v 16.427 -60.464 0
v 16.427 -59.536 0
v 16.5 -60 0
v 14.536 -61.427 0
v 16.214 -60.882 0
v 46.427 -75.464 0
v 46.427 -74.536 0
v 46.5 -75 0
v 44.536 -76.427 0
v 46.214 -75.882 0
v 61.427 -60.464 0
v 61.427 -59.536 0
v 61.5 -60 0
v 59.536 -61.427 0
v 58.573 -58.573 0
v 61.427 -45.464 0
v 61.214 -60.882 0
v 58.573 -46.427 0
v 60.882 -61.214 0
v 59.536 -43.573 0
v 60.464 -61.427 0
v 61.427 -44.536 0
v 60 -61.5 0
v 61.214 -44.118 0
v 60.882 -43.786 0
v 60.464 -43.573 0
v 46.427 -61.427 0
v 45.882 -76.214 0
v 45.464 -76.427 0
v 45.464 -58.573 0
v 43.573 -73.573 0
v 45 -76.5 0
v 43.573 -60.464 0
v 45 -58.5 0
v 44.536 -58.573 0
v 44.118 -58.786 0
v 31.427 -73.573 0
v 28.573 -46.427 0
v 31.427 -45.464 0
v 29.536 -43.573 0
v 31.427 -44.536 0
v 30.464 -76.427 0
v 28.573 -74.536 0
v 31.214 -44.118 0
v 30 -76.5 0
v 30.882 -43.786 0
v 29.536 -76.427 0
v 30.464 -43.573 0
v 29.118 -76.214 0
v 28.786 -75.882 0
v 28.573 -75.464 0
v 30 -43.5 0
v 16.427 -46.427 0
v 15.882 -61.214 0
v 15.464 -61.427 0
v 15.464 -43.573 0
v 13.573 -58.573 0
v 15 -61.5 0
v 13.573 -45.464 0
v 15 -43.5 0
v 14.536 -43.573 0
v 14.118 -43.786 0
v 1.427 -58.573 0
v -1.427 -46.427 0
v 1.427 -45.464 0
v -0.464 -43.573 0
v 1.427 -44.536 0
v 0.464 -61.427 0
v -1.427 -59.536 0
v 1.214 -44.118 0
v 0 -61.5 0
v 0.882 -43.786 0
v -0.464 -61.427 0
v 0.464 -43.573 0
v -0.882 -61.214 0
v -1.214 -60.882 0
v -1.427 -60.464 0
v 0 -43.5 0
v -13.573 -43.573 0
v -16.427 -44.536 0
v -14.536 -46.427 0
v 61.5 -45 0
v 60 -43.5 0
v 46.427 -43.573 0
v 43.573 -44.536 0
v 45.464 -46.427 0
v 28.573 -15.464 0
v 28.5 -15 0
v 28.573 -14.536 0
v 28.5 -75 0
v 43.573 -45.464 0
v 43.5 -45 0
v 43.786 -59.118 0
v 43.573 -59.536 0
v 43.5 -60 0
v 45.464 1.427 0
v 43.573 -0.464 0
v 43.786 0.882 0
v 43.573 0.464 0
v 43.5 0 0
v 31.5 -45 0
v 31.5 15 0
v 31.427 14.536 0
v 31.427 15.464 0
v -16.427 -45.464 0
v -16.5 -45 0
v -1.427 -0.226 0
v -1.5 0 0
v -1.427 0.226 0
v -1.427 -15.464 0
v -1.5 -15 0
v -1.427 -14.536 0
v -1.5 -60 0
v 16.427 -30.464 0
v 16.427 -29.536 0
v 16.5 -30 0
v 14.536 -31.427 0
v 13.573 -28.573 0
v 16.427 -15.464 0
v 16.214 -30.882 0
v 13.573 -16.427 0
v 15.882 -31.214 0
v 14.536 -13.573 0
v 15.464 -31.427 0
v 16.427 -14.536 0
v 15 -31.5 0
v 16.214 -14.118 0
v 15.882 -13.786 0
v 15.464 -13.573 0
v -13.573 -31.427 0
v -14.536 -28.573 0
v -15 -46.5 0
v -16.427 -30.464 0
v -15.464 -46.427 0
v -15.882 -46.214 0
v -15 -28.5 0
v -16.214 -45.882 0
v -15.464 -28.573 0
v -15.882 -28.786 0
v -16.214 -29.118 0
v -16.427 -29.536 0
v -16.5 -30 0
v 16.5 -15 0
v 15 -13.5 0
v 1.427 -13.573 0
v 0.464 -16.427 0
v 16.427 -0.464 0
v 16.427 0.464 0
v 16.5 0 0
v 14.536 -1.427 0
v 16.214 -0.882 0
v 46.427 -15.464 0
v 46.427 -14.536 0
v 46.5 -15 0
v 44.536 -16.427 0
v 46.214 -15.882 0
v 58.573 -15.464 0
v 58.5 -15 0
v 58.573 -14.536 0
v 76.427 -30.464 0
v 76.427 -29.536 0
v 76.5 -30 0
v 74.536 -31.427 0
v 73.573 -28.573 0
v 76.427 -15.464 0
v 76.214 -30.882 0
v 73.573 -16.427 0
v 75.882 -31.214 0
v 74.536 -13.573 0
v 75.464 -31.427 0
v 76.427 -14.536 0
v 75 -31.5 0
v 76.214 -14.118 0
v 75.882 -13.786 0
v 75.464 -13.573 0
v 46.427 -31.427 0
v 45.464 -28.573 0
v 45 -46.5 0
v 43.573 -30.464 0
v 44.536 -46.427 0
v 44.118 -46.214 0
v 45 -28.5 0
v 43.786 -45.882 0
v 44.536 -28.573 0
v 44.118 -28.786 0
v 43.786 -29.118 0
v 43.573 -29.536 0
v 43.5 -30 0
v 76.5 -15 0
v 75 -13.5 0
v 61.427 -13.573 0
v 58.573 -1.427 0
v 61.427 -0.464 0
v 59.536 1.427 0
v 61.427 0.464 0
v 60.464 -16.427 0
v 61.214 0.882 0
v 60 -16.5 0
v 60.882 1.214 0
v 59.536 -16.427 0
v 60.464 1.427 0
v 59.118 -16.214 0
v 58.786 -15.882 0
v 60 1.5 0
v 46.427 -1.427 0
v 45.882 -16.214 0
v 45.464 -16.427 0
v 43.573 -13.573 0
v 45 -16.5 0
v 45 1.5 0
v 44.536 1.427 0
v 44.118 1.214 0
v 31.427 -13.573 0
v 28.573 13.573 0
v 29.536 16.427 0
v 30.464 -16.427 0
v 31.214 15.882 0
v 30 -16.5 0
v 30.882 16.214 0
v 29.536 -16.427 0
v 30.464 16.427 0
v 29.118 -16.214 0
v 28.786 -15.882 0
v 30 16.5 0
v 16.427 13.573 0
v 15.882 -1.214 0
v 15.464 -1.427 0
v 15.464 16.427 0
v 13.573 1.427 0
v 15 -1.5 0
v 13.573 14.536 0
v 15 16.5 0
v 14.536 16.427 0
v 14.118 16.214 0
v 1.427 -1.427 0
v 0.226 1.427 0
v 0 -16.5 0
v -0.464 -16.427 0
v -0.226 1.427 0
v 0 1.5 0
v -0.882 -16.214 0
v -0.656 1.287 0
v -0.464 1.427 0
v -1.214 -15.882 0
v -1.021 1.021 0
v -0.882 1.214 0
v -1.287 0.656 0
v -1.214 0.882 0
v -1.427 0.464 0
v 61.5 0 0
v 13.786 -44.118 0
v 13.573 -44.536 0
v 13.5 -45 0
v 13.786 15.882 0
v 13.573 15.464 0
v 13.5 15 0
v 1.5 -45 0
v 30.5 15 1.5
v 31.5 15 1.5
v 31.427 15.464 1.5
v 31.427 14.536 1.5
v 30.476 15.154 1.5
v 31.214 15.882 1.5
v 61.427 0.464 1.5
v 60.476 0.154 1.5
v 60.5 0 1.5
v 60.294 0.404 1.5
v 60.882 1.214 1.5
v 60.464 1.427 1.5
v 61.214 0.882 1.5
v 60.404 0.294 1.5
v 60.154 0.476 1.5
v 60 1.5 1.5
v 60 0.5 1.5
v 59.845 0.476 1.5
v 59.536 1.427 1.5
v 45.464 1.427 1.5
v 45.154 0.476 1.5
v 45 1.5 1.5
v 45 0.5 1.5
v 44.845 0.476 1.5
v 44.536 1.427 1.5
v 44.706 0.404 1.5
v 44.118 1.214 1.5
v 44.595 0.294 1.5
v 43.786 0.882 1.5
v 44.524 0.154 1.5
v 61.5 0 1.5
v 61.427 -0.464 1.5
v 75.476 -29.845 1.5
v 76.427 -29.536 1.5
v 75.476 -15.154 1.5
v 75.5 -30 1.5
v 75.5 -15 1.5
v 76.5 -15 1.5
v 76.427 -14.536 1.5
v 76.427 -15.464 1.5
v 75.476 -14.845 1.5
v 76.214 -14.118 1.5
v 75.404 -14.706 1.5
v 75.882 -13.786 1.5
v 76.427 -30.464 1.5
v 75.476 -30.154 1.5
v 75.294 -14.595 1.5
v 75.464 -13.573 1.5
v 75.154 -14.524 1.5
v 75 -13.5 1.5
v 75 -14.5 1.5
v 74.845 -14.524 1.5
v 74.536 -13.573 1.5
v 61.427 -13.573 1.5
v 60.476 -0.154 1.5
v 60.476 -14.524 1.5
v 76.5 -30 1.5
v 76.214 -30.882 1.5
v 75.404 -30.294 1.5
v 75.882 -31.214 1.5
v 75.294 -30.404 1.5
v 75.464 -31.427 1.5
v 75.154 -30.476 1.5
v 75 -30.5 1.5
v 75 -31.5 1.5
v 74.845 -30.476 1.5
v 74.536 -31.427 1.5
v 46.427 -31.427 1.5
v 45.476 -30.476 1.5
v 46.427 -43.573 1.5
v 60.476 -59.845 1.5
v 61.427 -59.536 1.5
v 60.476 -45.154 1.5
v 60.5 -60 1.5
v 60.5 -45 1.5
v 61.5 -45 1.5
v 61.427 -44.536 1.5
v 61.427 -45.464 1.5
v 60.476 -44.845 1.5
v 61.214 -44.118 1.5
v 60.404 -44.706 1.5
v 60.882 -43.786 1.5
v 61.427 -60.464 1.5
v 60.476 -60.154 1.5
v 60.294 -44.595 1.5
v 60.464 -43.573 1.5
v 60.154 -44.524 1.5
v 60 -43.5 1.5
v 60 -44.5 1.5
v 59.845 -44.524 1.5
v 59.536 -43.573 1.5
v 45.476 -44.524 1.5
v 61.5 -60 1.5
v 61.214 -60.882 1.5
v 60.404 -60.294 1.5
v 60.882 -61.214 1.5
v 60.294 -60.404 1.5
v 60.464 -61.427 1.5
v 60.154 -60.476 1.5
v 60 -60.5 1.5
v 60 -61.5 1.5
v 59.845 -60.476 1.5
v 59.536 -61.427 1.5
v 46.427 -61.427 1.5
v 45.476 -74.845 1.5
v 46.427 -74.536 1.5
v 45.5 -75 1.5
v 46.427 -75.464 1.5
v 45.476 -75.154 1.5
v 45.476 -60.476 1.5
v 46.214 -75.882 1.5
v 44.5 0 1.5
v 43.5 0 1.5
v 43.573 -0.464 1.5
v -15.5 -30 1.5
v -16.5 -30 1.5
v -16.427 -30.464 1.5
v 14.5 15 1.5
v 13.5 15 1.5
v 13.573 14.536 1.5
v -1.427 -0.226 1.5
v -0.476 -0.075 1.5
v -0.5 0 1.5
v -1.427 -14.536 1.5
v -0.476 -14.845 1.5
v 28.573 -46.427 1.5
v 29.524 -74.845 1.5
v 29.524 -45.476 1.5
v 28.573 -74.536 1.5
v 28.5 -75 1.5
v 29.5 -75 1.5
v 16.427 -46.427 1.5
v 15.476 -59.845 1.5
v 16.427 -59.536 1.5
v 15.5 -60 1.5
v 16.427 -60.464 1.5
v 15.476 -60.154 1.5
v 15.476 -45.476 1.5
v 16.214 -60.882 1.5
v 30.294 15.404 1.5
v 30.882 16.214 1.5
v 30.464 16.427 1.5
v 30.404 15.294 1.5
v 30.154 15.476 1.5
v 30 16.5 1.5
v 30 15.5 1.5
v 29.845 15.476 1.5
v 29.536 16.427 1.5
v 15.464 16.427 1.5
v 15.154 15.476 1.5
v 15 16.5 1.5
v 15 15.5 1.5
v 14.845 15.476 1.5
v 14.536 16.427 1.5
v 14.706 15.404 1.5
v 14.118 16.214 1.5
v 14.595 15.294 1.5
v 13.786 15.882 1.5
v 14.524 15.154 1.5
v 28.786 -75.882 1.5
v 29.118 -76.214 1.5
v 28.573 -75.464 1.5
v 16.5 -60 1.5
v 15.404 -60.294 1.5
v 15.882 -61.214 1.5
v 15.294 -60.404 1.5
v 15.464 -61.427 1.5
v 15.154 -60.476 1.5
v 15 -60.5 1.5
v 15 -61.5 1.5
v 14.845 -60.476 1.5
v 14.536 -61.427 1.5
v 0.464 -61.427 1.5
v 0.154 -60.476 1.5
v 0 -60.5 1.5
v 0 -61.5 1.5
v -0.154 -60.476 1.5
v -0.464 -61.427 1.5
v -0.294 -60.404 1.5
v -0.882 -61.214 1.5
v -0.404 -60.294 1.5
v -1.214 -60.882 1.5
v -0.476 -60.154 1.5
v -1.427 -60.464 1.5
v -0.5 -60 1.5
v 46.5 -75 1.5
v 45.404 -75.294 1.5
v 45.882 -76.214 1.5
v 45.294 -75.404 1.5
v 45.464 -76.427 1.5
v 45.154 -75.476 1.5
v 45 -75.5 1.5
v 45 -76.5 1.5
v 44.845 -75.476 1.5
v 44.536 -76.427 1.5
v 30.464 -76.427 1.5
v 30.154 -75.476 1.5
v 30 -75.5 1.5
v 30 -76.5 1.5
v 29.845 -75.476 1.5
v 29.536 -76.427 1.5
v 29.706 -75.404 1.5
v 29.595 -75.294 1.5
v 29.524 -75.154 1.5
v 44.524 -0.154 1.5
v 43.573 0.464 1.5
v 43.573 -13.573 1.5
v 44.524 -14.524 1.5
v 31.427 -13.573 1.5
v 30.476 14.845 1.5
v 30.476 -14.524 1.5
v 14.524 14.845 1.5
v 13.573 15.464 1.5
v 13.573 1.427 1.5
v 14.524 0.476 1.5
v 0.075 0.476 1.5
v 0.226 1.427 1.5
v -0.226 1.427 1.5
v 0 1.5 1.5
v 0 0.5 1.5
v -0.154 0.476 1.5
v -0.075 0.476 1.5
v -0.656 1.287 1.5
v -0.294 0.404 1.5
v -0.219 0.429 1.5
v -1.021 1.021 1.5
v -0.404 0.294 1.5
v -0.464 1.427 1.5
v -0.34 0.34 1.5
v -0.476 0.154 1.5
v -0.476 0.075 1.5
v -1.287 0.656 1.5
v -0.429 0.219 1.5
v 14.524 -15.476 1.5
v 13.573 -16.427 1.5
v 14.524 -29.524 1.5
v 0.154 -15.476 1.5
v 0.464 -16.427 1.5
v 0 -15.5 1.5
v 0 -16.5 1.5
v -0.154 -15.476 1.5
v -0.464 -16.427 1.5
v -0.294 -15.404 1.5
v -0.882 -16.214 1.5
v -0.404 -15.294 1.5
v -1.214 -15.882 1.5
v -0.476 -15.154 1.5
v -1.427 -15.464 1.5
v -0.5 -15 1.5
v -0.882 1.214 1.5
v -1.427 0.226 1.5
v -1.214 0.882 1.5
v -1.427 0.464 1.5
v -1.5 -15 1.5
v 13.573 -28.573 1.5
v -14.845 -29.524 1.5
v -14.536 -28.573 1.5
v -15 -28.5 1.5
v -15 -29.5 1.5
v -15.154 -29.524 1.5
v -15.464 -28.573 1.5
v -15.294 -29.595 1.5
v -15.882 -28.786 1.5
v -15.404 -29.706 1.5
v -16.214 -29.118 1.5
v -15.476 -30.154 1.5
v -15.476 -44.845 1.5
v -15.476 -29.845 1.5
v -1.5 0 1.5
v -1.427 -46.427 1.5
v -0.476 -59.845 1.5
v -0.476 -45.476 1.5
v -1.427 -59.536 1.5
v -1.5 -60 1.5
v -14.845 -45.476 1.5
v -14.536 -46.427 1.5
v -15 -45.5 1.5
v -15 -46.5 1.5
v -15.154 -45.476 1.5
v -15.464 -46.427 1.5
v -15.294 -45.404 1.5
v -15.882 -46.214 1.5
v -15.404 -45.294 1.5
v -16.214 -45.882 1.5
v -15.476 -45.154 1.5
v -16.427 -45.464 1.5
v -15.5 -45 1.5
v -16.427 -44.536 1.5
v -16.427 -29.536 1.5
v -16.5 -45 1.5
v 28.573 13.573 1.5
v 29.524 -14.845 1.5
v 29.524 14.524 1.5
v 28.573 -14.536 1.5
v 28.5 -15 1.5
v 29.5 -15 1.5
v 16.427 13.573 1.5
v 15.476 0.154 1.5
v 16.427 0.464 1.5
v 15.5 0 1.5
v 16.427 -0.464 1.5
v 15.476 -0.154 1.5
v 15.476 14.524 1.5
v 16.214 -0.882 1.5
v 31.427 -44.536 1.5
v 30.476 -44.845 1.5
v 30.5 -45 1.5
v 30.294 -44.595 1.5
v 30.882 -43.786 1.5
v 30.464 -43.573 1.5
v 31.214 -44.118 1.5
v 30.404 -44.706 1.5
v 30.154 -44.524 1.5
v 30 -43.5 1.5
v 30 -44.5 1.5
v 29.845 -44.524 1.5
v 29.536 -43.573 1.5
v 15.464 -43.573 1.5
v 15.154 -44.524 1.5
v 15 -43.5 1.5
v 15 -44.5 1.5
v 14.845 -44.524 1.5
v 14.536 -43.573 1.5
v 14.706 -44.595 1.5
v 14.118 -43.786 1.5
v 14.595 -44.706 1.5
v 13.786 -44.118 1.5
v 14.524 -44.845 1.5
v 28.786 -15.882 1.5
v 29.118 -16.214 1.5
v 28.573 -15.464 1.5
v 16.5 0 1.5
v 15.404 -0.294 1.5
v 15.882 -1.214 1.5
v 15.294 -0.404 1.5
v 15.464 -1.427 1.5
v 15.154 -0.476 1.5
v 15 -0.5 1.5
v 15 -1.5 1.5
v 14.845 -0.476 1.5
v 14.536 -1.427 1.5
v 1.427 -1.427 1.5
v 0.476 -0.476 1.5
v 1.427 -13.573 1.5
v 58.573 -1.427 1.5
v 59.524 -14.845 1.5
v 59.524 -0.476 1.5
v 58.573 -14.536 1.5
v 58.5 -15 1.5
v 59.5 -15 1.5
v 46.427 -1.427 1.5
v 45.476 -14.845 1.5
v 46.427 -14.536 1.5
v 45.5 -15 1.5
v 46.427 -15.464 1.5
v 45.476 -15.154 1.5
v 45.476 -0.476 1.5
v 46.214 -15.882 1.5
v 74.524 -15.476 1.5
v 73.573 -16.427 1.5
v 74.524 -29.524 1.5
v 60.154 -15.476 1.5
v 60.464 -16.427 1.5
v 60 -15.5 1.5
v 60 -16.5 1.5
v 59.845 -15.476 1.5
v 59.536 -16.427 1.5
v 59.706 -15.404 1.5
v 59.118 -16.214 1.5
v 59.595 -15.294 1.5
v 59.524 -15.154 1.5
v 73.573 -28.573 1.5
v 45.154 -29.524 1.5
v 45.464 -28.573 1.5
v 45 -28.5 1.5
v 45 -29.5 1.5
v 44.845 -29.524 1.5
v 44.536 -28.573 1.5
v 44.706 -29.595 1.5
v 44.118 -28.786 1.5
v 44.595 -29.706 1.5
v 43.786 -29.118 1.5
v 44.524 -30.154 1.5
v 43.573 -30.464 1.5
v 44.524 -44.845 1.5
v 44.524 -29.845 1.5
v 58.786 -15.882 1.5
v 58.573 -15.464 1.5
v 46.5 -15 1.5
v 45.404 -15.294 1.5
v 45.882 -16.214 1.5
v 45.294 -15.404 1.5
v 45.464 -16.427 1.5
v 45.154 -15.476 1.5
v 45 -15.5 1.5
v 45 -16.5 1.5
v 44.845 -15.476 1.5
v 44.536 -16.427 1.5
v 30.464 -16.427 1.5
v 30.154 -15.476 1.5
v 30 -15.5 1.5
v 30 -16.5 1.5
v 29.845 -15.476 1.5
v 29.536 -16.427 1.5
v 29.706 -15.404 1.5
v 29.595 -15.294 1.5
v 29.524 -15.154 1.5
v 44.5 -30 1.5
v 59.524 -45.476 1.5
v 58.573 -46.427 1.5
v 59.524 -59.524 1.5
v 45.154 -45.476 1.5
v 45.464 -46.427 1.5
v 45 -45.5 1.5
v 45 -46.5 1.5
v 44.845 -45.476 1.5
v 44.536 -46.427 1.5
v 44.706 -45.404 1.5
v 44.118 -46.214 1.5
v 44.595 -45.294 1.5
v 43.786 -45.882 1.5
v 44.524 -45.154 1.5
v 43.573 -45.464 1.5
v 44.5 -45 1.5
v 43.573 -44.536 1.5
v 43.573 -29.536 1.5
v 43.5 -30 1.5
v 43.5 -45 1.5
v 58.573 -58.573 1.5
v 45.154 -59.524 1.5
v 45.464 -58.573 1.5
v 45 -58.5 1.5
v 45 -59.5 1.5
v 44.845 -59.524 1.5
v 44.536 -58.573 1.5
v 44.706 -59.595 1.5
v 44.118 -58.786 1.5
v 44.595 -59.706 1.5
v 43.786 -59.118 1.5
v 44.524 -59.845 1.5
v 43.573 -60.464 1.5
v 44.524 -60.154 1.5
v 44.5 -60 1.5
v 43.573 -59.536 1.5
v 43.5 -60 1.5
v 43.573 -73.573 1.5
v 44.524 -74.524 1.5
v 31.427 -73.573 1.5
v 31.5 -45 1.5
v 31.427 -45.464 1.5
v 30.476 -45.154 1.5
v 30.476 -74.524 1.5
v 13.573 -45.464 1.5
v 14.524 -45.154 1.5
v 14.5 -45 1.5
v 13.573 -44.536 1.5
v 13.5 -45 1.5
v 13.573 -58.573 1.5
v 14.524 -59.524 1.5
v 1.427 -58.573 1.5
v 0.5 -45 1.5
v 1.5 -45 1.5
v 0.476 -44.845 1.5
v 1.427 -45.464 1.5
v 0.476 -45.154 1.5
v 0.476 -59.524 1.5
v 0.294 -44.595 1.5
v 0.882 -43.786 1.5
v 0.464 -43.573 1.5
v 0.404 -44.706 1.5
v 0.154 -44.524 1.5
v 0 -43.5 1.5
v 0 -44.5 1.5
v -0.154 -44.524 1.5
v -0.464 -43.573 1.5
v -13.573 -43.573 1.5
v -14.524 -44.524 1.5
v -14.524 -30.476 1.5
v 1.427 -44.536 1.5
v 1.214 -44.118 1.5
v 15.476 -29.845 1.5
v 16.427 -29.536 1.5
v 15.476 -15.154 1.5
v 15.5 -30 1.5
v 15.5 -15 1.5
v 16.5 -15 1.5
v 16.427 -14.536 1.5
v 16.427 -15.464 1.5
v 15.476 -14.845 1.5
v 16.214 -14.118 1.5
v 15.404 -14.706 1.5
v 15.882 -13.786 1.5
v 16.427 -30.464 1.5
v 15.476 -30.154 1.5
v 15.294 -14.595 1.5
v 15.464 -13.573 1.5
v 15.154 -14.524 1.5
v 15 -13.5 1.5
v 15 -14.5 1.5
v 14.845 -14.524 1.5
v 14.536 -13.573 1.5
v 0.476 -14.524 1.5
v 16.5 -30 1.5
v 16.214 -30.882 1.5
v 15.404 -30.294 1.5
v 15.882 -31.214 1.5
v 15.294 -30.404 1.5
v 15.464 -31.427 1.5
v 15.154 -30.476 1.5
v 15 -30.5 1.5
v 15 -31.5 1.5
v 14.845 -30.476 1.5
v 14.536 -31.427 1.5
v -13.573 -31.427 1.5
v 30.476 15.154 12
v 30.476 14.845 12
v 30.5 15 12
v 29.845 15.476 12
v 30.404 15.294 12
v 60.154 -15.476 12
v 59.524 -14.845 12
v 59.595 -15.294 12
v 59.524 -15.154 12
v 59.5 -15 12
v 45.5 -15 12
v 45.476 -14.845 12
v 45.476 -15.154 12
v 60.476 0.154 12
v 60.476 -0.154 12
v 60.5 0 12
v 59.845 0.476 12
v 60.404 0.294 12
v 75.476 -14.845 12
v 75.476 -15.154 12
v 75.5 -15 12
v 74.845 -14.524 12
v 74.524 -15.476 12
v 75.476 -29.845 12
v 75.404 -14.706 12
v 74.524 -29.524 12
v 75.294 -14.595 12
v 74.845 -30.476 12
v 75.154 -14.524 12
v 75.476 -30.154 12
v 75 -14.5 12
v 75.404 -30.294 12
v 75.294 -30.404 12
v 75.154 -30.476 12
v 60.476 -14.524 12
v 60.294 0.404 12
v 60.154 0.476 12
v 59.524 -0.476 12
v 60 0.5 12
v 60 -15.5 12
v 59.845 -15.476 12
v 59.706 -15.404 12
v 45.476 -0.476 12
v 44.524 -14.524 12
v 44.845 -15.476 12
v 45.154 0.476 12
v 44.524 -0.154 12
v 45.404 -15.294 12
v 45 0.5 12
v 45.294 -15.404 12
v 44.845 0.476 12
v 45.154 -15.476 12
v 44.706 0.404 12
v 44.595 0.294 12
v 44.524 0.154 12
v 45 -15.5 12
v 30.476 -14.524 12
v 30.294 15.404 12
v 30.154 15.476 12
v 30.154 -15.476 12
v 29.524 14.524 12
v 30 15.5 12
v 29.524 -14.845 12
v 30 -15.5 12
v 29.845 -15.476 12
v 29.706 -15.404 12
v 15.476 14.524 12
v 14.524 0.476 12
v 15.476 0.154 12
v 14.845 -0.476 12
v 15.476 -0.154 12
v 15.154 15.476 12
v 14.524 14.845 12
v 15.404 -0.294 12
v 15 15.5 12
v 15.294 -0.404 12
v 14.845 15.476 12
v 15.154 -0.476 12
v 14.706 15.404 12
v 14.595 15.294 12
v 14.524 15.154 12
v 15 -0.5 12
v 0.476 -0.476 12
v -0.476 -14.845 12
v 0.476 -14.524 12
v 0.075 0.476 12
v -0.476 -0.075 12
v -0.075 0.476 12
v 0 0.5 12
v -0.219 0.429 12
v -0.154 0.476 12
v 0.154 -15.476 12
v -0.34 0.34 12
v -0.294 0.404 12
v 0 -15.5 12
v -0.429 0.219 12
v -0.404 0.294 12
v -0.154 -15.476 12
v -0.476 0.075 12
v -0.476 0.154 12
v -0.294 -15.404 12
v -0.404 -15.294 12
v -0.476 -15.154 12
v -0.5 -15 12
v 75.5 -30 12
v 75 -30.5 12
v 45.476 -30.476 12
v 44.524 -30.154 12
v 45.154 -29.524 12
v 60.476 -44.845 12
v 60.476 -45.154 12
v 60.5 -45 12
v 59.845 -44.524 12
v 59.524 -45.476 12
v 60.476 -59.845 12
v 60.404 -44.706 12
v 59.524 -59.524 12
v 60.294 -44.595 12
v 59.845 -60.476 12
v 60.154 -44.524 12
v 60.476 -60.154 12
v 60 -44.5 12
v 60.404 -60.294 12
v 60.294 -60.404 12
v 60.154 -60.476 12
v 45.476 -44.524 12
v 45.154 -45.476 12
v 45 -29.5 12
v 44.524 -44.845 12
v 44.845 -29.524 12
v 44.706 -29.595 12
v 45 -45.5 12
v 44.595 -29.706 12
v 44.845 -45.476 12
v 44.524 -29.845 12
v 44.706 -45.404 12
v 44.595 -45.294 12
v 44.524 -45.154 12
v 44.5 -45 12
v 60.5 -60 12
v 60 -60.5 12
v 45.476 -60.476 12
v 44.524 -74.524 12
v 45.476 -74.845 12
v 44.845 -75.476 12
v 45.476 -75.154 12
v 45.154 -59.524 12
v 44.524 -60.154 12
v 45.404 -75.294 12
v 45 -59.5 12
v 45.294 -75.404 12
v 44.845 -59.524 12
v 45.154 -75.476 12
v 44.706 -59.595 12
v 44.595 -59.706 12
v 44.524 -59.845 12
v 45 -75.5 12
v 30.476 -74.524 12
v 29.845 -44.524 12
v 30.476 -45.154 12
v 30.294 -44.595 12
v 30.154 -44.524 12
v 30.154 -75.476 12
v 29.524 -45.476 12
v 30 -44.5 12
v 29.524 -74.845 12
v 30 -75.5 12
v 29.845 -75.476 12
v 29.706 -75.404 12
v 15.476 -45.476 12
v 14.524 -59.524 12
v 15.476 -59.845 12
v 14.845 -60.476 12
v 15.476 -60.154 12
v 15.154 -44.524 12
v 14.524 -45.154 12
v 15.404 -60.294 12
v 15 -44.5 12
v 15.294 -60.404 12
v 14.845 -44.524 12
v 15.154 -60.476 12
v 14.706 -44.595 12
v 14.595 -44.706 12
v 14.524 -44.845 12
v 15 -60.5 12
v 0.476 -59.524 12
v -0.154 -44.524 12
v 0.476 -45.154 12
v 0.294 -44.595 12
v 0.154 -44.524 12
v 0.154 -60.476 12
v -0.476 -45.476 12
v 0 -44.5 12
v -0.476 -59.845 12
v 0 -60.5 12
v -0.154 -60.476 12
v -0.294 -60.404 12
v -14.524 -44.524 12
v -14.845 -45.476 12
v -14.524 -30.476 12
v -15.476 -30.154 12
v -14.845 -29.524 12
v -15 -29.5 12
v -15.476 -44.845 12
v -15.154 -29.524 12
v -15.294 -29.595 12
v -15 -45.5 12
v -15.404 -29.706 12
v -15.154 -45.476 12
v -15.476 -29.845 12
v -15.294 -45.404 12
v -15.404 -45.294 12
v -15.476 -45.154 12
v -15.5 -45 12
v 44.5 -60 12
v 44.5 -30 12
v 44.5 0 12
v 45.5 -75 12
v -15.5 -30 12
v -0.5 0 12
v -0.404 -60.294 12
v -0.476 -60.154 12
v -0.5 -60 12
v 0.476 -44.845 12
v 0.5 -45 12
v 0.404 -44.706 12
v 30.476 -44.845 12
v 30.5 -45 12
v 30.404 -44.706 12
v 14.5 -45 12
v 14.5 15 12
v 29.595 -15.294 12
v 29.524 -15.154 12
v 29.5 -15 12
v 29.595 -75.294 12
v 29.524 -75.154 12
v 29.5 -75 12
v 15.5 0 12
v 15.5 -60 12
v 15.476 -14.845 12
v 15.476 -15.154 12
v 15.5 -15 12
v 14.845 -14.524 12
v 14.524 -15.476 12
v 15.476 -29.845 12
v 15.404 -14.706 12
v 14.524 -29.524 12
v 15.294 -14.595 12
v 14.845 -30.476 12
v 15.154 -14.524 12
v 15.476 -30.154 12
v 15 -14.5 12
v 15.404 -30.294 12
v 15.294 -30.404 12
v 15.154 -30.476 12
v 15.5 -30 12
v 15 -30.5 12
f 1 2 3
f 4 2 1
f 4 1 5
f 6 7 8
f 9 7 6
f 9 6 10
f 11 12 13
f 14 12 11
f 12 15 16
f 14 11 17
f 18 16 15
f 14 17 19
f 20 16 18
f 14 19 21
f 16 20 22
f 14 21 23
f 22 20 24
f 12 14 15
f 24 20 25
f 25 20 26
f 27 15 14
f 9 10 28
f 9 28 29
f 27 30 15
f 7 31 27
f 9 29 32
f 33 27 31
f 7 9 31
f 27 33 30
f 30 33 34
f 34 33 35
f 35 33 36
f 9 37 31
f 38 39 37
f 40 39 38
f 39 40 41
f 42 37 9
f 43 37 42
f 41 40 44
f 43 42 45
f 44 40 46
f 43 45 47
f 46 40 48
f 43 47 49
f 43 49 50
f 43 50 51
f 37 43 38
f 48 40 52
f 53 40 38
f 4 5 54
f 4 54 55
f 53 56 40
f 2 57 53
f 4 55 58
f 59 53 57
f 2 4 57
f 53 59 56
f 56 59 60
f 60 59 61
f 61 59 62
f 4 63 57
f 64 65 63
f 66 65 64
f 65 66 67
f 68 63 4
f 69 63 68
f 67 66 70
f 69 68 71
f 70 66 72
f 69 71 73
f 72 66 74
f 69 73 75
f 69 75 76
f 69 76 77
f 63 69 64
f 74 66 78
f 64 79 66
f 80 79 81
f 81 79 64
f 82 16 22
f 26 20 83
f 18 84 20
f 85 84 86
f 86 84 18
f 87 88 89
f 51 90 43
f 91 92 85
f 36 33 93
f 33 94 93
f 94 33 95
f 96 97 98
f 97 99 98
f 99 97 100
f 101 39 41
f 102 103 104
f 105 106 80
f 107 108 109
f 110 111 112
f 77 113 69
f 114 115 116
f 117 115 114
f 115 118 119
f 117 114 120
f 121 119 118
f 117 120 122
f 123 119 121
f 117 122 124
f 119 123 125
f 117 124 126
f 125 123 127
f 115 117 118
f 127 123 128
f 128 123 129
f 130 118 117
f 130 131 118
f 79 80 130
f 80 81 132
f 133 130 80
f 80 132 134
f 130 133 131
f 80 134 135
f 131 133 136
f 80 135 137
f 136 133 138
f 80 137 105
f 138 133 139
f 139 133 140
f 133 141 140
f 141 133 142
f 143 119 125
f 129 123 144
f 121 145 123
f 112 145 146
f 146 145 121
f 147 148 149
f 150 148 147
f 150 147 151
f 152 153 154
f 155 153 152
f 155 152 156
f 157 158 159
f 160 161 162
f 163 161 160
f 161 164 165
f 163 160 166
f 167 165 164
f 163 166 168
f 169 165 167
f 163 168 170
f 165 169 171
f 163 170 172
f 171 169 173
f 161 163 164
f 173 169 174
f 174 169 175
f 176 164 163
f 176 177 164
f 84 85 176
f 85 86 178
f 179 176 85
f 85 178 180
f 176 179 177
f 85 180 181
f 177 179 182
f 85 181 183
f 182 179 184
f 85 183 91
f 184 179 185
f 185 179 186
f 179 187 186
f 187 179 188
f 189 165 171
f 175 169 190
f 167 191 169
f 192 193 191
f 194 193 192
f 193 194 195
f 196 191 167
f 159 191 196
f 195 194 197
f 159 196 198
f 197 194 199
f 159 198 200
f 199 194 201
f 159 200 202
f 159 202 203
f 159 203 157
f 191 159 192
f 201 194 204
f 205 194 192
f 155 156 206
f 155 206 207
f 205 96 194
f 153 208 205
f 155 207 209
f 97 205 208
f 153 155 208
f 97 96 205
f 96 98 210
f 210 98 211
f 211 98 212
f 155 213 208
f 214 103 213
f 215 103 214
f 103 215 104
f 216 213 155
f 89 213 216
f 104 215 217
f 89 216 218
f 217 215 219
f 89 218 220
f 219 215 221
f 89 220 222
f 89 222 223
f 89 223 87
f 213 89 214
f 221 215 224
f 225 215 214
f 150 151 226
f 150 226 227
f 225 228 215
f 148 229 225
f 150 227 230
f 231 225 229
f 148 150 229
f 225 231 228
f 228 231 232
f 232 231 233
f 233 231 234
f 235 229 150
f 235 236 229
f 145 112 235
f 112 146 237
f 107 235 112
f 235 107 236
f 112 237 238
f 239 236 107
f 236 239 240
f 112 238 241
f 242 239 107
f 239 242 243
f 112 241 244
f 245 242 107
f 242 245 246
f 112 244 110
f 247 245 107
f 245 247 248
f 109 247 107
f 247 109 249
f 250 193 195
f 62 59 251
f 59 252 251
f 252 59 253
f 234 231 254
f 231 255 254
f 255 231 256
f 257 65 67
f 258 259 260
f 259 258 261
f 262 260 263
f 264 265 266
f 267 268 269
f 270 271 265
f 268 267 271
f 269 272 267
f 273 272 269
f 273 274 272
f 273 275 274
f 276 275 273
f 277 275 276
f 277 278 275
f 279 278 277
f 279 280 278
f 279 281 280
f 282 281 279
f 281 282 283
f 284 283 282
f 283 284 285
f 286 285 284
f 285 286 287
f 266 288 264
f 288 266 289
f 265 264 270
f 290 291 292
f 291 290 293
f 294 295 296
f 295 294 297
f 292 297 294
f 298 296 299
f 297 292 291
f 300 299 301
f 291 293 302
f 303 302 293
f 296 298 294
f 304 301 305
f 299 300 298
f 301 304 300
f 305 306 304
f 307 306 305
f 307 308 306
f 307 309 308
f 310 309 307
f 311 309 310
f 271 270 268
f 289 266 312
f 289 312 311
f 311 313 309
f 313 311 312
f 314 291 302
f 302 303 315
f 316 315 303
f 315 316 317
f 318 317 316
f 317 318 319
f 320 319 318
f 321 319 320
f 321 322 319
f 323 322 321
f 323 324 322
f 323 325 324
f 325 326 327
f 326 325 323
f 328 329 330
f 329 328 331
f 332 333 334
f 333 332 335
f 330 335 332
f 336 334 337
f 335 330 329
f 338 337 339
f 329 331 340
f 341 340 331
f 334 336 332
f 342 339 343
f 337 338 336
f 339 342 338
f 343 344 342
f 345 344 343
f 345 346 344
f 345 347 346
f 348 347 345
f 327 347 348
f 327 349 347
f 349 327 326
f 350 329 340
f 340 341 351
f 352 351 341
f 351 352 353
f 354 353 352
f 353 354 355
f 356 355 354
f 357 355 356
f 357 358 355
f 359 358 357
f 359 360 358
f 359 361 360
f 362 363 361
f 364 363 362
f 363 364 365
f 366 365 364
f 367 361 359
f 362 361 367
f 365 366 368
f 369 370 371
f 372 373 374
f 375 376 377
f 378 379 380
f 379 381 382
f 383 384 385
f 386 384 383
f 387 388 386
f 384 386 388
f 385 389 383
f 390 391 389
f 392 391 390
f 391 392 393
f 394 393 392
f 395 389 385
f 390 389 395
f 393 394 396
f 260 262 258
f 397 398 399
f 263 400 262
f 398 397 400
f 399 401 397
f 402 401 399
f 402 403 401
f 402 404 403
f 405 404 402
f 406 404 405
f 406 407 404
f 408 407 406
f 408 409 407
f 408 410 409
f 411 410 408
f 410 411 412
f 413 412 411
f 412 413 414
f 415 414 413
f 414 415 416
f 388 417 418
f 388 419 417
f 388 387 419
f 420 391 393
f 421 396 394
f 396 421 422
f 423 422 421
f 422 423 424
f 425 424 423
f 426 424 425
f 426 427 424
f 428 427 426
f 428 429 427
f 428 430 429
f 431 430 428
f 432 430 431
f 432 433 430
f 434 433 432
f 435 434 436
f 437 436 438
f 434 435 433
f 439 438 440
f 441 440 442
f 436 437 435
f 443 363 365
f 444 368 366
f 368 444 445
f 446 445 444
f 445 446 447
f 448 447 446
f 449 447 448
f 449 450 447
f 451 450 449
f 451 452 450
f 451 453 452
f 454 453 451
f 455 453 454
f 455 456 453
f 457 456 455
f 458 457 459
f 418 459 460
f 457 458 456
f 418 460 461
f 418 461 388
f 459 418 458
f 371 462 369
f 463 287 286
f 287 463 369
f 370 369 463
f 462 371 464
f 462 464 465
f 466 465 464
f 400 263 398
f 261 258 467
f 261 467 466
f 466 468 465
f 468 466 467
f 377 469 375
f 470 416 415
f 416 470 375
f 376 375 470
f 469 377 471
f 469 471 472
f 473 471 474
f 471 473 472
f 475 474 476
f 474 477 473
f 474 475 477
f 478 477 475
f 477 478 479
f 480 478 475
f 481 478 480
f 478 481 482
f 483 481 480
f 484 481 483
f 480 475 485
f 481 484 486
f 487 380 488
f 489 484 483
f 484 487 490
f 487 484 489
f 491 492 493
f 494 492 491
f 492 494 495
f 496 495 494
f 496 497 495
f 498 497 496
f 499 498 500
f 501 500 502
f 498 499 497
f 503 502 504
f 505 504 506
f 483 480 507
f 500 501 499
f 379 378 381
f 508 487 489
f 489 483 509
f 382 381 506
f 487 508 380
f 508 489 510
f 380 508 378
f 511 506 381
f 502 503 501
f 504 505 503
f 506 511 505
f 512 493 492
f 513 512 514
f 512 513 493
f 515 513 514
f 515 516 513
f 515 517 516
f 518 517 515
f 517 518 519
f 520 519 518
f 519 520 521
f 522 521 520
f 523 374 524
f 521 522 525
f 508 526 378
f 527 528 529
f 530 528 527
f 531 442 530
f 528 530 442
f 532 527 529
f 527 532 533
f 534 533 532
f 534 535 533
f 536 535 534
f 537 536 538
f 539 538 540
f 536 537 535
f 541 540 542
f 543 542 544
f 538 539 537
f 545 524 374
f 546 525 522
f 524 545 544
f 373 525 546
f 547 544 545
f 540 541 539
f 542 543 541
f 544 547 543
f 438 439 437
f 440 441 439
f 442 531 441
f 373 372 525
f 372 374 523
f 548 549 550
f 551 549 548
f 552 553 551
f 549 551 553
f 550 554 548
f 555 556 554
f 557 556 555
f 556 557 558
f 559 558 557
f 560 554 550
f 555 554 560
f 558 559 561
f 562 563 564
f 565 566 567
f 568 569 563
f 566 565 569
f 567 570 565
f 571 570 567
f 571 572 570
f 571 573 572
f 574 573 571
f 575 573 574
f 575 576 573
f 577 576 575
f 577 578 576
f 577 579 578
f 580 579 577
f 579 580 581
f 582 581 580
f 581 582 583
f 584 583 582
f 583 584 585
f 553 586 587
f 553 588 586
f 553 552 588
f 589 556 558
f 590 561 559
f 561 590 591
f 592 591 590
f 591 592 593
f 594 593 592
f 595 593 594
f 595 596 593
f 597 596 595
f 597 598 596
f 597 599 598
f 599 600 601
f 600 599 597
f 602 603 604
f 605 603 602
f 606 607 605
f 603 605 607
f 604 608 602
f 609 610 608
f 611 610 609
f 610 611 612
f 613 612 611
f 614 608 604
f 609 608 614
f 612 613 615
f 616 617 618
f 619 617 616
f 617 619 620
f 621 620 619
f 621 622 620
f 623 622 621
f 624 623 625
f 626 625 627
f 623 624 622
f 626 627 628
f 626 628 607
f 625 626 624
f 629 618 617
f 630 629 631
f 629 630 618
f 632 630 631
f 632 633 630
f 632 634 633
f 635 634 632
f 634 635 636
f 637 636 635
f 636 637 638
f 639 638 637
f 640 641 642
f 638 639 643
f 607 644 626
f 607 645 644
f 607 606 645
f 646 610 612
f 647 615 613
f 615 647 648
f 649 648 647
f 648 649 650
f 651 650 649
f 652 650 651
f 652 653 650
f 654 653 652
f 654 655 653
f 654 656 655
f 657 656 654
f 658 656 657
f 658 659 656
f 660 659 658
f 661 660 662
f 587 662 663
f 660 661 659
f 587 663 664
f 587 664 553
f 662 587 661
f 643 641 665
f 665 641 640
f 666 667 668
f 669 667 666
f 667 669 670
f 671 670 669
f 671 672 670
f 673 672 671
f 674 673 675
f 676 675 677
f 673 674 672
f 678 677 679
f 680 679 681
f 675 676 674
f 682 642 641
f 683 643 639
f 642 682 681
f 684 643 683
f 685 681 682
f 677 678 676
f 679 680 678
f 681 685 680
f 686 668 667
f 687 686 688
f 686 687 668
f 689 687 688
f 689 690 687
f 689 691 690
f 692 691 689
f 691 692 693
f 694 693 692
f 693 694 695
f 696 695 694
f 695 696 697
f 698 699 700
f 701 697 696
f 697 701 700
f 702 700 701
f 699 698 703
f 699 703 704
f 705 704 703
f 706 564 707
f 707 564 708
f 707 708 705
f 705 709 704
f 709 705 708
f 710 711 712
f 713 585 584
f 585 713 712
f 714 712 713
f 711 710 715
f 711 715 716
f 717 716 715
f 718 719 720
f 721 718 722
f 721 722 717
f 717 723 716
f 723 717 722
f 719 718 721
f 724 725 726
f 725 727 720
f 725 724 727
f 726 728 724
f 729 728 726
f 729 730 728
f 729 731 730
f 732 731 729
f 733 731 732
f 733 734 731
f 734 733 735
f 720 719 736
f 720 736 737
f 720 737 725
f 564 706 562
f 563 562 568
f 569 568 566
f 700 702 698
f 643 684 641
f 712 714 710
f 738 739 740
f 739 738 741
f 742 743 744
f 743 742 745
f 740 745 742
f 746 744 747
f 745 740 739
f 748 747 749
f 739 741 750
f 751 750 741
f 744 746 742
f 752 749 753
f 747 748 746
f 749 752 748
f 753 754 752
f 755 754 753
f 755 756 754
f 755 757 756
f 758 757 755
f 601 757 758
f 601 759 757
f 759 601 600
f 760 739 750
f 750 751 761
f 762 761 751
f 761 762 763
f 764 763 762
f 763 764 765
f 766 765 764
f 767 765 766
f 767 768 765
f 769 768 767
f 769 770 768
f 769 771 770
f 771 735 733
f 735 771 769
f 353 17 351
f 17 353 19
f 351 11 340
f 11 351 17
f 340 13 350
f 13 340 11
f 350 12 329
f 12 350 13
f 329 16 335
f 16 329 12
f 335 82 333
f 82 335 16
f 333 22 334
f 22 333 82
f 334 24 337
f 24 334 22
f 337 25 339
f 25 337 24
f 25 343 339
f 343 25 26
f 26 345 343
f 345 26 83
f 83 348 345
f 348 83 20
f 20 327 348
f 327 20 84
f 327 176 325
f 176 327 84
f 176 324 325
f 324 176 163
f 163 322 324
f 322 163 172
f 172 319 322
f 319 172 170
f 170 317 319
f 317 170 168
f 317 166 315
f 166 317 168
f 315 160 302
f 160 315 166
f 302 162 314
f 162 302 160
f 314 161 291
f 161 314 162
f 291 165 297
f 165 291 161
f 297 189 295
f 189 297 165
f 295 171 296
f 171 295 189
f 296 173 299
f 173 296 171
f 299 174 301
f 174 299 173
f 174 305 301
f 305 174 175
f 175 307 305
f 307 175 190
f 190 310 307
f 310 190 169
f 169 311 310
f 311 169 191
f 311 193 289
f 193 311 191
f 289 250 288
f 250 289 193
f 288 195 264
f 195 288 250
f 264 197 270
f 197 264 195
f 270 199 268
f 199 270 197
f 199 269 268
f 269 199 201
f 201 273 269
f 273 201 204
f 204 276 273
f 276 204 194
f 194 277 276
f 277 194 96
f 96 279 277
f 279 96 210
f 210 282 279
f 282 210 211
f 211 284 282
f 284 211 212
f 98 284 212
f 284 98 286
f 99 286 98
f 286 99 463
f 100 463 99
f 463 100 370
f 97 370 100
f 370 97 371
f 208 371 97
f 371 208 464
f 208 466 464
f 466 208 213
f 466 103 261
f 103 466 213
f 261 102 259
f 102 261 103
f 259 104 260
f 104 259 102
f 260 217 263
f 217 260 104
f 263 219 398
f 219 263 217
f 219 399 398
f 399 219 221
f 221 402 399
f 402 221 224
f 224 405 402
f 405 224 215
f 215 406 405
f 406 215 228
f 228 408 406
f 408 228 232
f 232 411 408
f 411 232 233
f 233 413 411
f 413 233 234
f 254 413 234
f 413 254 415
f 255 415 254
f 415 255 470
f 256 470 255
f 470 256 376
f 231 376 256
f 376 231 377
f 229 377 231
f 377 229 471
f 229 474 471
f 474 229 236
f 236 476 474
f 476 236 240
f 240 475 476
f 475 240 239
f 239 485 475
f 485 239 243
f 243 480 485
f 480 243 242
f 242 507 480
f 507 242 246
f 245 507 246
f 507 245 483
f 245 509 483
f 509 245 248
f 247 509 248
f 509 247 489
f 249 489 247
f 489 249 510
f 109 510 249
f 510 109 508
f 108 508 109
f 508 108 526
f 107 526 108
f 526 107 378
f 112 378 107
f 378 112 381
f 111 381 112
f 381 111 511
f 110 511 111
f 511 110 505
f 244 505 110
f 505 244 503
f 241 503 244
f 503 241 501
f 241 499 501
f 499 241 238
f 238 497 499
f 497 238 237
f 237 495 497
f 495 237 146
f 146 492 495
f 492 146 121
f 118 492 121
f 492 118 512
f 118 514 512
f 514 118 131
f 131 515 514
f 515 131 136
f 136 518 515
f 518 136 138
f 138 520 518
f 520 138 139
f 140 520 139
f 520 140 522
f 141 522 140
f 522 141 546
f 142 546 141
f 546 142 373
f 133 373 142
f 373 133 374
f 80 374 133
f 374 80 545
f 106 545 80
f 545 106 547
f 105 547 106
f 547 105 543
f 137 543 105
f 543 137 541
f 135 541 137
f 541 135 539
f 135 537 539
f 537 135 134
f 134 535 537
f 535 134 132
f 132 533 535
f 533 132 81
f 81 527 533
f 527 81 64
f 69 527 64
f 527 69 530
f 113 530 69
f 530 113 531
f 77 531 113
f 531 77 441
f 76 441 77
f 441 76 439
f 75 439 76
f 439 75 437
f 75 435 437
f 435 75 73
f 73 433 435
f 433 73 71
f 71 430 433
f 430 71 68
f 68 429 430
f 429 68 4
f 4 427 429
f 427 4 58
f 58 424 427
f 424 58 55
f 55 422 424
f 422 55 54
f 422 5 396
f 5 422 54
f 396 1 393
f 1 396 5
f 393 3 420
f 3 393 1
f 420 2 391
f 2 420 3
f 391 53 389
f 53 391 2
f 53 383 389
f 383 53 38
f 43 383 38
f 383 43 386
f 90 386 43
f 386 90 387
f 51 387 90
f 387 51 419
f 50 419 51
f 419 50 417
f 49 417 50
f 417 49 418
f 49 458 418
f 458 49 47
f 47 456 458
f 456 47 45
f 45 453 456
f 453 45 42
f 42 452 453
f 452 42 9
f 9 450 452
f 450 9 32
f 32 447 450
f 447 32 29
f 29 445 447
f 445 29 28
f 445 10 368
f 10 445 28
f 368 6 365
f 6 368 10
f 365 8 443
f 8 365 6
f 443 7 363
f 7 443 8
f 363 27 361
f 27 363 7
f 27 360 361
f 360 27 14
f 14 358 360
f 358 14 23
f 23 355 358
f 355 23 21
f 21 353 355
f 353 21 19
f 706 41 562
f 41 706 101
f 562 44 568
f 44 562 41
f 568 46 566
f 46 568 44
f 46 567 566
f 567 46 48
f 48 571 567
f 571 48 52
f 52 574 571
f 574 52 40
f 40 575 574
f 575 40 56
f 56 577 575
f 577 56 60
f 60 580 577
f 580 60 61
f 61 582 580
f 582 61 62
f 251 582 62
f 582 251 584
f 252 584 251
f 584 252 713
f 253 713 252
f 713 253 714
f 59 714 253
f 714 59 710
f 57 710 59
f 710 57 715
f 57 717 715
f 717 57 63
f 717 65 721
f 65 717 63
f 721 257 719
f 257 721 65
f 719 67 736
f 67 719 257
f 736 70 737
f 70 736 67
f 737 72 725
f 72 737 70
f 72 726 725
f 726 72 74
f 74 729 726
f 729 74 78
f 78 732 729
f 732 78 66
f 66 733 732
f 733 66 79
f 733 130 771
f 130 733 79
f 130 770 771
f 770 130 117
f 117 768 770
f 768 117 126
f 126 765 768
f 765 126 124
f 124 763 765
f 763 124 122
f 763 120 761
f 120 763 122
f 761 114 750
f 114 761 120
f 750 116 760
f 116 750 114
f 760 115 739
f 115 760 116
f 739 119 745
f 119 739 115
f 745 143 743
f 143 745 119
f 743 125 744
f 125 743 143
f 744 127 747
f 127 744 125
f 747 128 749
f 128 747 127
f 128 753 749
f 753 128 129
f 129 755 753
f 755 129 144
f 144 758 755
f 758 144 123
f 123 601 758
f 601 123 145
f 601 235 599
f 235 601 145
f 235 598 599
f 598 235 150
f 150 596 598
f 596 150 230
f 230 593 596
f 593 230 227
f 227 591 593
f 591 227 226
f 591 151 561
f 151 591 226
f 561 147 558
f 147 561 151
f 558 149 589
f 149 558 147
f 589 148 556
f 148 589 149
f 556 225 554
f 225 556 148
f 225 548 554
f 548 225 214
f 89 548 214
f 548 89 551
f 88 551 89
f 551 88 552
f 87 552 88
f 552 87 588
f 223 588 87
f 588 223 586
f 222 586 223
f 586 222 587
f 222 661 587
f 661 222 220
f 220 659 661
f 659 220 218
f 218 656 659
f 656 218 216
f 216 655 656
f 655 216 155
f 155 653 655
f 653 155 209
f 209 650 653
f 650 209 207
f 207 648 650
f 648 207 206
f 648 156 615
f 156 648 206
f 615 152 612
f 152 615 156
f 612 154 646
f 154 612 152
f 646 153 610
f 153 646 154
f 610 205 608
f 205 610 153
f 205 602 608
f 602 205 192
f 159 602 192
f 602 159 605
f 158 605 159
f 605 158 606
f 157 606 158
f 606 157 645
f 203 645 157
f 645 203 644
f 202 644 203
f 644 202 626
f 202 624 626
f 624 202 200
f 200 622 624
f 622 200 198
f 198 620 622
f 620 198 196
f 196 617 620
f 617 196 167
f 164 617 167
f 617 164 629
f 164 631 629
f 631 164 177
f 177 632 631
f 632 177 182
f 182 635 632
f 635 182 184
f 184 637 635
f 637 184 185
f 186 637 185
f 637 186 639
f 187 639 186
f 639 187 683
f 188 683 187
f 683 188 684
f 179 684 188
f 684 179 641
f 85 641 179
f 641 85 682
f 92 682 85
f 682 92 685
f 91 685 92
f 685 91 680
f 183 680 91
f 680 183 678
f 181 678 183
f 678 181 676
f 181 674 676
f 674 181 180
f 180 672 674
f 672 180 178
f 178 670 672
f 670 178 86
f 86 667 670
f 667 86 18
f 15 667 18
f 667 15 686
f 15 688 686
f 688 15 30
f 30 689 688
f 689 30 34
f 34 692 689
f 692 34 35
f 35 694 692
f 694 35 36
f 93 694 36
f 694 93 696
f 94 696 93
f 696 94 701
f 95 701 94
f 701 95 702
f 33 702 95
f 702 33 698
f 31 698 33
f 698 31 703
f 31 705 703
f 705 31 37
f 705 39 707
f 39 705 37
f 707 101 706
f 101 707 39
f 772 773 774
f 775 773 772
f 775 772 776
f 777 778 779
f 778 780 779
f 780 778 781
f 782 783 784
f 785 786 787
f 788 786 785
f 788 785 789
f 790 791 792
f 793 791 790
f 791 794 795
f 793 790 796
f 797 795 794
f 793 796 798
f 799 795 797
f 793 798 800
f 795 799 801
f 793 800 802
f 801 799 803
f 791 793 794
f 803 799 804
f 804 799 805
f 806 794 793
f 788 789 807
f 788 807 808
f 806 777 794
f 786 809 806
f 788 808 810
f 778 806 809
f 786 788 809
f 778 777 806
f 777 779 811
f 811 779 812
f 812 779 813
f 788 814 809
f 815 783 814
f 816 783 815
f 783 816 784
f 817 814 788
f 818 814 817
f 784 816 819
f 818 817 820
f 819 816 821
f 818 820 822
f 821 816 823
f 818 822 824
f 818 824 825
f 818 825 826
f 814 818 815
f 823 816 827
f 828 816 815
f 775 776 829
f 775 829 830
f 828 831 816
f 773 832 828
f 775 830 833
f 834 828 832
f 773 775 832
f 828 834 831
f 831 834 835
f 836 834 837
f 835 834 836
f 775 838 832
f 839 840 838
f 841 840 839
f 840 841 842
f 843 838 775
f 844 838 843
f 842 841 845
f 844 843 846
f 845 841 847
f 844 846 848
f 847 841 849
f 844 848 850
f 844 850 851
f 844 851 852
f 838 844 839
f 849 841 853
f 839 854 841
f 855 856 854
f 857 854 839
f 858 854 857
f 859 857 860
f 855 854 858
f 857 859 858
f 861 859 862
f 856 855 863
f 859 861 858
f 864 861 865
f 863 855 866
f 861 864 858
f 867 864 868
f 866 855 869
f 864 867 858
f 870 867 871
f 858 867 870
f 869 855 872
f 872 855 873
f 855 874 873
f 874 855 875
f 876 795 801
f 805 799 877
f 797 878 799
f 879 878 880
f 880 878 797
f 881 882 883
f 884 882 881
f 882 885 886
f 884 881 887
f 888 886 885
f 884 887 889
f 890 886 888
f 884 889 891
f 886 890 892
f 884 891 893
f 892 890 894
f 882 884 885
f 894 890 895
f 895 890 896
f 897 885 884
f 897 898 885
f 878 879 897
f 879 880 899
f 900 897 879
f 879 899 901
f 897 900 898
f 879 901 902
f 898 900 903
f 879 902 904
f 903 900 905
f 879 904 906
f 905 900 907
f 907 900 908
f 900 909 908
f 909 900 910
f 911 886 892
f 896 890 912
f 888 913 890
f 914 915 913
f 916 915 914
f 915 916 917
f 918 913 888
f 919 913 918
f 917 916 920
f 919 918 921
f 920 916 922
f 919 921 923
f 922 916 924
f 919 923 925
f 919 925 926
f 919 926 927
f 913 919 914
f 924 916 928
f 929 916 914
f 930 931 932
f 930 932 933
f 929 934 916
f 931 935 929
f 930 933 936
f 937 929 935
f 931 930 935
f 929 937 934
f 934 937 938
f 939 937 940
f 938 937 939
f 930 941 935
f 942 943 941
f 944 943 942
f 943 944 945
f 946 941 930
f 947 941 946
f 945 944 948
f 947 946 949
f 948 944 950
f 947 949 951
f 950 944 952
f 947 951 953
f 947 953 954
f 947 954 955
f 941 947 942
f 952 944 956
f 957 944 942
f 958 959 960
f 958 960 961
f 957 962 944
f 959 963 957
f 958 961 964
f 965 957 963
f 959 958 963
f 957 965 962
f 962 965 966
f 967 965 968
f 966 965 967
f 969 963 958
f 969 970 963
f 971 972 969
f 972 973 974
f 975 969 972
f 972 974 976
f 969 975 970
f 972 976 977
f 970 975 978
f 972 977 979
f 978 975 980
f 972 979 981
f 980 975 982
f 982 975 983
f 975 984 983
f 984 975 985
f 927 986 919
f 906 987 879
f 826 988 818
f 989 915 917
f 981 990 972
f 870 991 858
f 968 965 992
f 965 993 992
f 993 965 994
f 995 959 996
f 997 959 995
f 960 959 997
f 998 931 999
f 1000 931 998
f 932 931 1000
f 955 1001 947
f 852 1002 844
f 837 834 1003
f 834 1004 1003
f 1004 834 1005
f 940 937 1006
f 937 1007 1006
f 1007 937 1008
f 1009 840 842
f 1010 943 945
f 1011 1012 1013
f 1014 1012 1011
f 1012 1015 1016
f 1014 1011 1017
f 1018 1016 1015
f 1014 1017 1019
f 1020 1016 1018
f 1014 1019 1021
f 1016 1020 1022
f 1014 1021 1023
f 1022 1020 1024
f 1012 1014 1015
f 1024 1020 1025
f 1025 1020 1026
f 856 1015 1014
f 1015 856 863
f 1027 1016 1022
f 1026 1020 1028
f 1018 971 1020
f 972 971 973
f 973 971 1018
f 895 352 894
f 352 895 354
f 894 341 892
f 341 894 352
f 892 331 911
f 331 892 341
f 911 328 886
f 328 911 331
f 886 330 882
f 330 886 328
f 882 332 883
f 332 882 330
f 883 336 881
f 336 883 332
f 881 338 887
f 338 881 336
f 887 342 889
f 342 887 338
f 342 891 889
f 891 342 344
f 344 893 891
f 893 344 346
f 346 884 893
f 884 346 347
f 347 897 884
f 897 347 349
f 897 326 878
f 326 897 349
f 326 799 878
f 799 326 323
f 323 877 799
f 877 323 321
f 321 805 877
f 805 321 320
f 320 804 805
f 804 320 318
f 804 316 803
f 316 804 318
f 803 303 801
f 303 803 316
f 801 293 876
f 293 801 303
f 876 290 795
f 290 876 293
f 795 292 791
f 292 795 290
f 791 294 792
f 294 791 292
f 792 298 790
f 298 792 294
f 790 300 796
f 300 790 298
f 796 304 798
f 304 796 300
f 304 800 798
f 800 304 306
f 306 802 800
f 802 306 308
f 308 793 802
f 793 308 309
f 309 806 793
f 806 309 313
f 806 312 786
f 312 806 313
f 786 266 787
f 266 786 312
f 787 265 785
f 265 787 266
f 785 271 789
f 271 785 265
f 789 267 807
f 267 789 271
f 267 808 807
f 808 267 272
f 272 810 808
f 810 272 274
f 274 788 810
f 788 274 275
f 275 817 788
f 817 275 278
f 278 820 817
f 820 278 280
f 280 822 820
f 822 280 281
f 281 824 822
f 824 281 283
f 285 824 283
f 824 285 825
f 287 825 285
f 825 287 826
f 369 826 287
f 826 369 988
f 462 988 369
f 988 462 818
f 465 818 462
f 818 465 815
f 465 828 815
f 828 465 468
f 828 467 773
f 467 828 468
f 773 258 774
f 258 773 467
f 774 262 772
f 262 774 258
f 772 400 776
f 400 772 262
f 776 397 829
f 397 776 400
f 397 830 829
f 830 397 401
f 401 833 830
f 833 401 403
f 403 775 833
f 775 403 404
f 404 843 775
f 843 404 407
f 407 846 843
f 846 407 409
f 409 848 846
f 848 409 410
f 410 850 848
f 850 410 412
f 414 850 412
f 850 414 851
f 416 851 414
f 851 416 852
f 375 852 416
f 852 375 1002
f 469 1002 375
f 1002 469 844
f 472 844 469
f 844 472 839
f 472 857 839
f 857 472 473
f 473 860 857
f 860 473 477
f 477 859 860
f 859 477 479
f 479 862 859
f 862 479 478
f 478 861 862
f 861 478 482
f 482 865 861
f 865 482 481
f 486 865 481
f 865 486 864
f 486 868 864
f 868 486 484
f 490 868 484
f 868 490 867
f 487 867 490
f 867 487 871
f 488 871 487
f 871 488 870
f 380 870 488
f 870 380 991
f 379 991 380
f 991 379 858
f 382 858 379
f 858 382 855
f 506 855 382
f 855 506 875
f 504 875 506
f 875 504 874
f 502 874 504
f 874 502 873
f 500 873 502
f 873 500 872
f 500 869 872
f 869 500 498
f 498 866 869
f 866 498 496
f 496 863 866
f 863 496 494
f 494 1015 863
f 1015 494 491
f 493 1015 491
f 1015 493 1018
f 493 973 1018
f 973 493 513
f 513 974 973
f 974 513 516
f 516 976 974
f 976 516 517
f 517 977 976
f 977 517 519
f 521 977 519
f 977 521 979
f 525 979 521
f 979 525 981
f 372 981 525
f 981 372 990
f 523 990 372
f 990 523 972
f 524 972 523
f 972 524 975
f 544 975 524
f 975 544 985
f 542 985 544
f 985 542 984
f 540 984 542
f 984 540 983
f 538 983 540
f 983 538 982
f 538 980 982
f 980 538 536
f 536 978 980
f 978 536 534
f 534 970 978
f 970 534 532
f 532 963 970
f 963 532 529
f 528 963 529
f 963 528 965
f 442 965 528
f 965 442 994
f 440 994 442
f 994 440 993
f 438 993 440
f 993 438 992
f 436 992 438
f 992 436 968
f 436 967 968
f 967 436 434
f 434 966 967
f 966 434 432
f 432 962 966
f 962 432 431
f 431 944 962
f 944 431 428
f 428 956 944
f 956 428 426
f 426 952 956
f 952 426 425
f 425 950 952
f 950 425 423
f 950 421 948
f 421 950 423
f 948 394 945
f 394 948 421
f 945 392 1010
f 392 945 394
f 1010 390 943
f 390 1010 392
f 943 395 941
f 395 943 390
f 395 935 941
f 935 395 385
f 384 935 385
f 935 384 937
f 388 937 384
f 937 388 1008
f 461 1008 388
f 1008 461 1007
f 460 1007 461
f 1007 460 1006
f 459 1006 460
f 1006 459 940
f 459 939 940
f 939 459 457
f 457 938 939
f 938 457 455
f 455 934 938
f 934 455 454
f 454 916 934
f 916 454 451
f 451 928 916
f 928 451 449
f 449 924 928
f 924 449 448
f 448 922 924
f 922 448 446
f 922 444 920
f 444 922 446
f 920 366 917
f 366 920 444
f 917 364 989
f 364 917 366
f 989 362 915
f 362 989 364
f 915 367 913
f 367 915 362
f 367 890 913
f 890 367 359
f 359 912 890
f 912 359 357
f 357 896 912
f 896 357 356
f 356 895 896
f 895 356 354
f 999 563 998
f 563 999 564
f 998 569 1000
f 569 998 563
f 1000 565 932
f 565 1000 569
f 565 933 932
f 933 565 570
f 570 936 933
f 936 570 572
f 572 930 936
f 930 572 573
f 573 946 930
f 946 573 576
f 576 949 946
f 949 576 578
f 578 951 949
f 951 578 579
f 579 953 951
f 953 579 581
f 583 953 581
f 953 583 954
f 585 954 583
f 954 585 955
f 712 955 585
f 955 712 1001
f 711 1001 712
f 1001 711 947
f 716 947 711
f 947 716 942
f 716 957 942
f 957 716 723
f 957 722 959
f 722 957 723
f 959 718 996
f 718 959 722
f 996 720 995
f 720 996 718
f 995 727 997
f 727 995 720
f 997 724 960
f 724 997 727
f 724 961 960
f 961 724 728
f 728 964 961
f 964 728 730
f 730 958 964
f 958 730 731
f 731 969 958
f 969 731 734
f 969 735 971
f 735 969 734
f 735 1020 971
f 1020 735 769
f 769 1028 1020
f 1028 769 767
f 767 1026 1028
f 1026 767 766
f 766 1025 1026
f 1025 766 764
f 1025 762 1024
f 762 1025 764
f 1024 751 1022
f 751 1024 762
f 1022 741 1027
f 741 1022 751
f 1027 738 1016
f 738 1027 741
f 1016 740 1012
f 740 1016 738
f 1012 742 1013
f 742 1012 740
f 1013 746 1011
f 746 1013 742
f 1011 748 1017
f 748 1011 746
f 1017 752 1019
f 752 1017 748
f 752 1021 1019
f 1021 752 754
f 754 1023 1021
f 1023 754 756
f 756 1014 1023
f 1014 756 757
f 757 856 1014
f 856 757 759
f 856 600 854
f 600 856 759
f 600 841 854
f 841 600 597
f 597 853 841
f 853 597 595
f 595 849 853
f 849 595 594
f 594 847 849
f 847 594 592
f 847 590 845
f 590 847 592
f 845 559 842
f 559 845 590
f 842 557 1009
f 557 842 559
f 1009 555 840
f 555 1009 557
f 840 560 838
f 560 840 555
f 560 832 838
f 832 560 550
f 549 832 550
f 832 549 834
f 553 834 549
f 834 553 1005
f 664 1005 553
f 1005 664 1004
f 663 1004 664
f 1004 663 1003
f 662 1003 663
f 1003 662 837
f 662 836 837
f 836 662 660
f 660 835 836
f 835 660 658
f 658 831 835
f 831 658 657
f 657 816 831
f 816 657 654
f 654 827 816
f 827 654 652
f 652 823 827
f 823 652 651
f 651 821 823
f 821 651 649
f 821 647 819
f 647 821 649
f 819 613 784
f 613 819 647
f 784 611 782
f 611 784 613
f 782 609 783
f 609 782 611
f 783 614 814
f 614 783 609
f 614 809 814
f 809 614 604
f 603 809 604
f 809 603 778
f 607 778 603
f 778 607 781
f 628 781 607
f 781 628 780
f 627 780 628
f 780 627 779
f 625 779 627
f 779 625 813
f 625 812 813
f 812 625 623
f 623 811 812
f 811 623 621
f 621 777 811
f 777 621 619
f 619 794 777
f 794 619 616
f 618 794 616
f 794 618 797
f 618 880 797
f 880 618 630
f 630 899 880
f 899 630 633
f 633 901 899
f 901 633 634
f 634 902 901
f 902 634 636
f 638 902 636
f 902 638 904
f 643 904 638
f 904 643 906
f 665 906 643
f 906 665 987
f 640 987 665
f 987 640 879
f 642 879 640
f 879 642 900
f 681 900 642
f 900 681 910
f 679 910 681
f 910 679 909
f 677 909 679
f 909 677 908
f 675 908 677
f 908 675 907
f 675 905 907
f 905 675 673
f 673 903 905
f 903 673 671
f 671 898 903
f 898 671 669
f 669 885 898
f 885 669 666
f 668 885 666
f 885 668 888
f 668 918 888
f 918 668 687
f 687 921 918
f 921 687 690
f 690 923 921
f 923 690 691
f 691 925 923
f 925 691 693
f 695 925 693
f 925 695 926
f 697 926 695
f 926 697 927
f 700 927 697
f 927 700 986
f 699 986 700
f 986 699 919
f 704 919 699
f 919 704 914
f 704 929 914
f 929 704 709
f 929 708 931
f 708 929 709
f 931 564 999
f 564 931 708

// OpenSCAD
wallFlareWidth = 3;
wallFlareThickness = 1.5;
wallHeight = 12;
wallWidth = 1;

lineSegment = 15;
iterations = 1;

angle = 90;
axiom = "F+F+F+F";
rules = [["F", "F-F+F+FF-F-F+F"]];

module end_of_parameters_dummy() {}

//use <lsystem.scad>;

function isString(v) = v >= ""; // this seems to be the fastest way

// search without not-found warnings
function lookup(c, r)
    = let(r1 = concat(r, [[c,c]]))
        r1[search(c, r1)[0]][1];

function rest(list) = len(list)<=1 ? [] : [for(i=[1:len(list)-1]) list[i]];

function cat(strings, i=0, sofar="")
    = i>=len(strings) ? sofar : cat(strings, i=i+1, sofar=str(sofar,strings[i]));

function evolve1(rules, axiom)
    = cat([for (i=[0:len(axiom)-1]) lookup(axiom[i], rules)]);

function lsystem(rules, axiom, n=1)
    = n==0 ? axiom
             : lsystem(rules, evolve1(rules, axiom), n=n-1);

function pitchMatrix(angle)
    = [[cos(angle), 0, -sin(angle),0],
                [0,          1, 0,0],
                [sin(angle), 0, cos(angle),0],
                [0,0,0,1]];

function yawMatrix(angle)
    =  [[cos(angle), -sin(angle), 0,0],
                [sin(angle), cos(angle),0,0],
                [0,          0,          1,0],
                [0,0,0,1]];

function rollMatrix(angle)
    = [[1,          0,          0,0],
                [0, cos(angle),-sin(angle),0],
                [0, sin(angle),cos(angle),0],
                [0,0,0,1]
                ];

function forwardMatrix(distance)
    = [[1,0,0,distance], [0,1,0,0], [0,0,1,0], [0,0,0,1]];

function identityMatrix()
    = [[1,0,0,0], [0,1,0,0], [0,0,1,0], [0,0,0,1]];


function evolveState1(f, state) =
    isString(f) ? state :
    f[0] == "m" ? [ state[0], state[1]*f[1] ] :
    f[0] == "push" ? concat([ concat([rest(state)], state[0]) ], rest(state)) :
    f[0] == "pop" ? concat([rest(state[0])], state[0][0]) :
    state;

function evolveState(string, functions, state, n=0, soFar=[]) =
    n >= len(string) ? concat(soFar, [rest(state)]) :
        evolveState(string, functions,
            evolveState1(lookup(string[n],functions), state),
            n=n+1, soFar=concat(soFar, [rest(state)]));

module traceStates(states) {
    for (i=[1:len(states)-1])
        hull() {
            multmatrix(states[i-1][0]) children();
            multmatrix(states[i][0]) children();
        }
}

module drawLSystem(rules,axiom,n,functions,baseState=[ [], identityMatrix() ]) {
    traceStates(evolveState(lsystem(rules,axiom,n), functions, baseState)) children();
}



module dummy();

forward = lineSegment;

baseState  = [ [], identityMatrix() ];
functions =
    [
      ["F", ["m", forwardMatrix(forward)]],
      ["-", ["m", yawMatrix(angle)]],
      ["+", ["m", yawMatrix(-angle)]],
      ["^", ["m", pitchMatrix(angle)]],
      ["&", ["m", pitchMatrix(-angle)]],
      [">", ["m", rollMatrix(angle)]],
      ["<", ["m", rollMatrix(-angle)]],
      ["[", ["push"]],
      ["]", ["pop"]]
      ];

out = lsystem(rules,axiom,iterations);
states = evolveState(out,functions, baseState);
linear_extrude(height=wallFlareThickness) traceStates(states) circle(d=wallFlareWidth,$fn=10);
linear_extrude(height=wallHeight) traceStates(states) circle(d=wallWidth,$fn=10);
